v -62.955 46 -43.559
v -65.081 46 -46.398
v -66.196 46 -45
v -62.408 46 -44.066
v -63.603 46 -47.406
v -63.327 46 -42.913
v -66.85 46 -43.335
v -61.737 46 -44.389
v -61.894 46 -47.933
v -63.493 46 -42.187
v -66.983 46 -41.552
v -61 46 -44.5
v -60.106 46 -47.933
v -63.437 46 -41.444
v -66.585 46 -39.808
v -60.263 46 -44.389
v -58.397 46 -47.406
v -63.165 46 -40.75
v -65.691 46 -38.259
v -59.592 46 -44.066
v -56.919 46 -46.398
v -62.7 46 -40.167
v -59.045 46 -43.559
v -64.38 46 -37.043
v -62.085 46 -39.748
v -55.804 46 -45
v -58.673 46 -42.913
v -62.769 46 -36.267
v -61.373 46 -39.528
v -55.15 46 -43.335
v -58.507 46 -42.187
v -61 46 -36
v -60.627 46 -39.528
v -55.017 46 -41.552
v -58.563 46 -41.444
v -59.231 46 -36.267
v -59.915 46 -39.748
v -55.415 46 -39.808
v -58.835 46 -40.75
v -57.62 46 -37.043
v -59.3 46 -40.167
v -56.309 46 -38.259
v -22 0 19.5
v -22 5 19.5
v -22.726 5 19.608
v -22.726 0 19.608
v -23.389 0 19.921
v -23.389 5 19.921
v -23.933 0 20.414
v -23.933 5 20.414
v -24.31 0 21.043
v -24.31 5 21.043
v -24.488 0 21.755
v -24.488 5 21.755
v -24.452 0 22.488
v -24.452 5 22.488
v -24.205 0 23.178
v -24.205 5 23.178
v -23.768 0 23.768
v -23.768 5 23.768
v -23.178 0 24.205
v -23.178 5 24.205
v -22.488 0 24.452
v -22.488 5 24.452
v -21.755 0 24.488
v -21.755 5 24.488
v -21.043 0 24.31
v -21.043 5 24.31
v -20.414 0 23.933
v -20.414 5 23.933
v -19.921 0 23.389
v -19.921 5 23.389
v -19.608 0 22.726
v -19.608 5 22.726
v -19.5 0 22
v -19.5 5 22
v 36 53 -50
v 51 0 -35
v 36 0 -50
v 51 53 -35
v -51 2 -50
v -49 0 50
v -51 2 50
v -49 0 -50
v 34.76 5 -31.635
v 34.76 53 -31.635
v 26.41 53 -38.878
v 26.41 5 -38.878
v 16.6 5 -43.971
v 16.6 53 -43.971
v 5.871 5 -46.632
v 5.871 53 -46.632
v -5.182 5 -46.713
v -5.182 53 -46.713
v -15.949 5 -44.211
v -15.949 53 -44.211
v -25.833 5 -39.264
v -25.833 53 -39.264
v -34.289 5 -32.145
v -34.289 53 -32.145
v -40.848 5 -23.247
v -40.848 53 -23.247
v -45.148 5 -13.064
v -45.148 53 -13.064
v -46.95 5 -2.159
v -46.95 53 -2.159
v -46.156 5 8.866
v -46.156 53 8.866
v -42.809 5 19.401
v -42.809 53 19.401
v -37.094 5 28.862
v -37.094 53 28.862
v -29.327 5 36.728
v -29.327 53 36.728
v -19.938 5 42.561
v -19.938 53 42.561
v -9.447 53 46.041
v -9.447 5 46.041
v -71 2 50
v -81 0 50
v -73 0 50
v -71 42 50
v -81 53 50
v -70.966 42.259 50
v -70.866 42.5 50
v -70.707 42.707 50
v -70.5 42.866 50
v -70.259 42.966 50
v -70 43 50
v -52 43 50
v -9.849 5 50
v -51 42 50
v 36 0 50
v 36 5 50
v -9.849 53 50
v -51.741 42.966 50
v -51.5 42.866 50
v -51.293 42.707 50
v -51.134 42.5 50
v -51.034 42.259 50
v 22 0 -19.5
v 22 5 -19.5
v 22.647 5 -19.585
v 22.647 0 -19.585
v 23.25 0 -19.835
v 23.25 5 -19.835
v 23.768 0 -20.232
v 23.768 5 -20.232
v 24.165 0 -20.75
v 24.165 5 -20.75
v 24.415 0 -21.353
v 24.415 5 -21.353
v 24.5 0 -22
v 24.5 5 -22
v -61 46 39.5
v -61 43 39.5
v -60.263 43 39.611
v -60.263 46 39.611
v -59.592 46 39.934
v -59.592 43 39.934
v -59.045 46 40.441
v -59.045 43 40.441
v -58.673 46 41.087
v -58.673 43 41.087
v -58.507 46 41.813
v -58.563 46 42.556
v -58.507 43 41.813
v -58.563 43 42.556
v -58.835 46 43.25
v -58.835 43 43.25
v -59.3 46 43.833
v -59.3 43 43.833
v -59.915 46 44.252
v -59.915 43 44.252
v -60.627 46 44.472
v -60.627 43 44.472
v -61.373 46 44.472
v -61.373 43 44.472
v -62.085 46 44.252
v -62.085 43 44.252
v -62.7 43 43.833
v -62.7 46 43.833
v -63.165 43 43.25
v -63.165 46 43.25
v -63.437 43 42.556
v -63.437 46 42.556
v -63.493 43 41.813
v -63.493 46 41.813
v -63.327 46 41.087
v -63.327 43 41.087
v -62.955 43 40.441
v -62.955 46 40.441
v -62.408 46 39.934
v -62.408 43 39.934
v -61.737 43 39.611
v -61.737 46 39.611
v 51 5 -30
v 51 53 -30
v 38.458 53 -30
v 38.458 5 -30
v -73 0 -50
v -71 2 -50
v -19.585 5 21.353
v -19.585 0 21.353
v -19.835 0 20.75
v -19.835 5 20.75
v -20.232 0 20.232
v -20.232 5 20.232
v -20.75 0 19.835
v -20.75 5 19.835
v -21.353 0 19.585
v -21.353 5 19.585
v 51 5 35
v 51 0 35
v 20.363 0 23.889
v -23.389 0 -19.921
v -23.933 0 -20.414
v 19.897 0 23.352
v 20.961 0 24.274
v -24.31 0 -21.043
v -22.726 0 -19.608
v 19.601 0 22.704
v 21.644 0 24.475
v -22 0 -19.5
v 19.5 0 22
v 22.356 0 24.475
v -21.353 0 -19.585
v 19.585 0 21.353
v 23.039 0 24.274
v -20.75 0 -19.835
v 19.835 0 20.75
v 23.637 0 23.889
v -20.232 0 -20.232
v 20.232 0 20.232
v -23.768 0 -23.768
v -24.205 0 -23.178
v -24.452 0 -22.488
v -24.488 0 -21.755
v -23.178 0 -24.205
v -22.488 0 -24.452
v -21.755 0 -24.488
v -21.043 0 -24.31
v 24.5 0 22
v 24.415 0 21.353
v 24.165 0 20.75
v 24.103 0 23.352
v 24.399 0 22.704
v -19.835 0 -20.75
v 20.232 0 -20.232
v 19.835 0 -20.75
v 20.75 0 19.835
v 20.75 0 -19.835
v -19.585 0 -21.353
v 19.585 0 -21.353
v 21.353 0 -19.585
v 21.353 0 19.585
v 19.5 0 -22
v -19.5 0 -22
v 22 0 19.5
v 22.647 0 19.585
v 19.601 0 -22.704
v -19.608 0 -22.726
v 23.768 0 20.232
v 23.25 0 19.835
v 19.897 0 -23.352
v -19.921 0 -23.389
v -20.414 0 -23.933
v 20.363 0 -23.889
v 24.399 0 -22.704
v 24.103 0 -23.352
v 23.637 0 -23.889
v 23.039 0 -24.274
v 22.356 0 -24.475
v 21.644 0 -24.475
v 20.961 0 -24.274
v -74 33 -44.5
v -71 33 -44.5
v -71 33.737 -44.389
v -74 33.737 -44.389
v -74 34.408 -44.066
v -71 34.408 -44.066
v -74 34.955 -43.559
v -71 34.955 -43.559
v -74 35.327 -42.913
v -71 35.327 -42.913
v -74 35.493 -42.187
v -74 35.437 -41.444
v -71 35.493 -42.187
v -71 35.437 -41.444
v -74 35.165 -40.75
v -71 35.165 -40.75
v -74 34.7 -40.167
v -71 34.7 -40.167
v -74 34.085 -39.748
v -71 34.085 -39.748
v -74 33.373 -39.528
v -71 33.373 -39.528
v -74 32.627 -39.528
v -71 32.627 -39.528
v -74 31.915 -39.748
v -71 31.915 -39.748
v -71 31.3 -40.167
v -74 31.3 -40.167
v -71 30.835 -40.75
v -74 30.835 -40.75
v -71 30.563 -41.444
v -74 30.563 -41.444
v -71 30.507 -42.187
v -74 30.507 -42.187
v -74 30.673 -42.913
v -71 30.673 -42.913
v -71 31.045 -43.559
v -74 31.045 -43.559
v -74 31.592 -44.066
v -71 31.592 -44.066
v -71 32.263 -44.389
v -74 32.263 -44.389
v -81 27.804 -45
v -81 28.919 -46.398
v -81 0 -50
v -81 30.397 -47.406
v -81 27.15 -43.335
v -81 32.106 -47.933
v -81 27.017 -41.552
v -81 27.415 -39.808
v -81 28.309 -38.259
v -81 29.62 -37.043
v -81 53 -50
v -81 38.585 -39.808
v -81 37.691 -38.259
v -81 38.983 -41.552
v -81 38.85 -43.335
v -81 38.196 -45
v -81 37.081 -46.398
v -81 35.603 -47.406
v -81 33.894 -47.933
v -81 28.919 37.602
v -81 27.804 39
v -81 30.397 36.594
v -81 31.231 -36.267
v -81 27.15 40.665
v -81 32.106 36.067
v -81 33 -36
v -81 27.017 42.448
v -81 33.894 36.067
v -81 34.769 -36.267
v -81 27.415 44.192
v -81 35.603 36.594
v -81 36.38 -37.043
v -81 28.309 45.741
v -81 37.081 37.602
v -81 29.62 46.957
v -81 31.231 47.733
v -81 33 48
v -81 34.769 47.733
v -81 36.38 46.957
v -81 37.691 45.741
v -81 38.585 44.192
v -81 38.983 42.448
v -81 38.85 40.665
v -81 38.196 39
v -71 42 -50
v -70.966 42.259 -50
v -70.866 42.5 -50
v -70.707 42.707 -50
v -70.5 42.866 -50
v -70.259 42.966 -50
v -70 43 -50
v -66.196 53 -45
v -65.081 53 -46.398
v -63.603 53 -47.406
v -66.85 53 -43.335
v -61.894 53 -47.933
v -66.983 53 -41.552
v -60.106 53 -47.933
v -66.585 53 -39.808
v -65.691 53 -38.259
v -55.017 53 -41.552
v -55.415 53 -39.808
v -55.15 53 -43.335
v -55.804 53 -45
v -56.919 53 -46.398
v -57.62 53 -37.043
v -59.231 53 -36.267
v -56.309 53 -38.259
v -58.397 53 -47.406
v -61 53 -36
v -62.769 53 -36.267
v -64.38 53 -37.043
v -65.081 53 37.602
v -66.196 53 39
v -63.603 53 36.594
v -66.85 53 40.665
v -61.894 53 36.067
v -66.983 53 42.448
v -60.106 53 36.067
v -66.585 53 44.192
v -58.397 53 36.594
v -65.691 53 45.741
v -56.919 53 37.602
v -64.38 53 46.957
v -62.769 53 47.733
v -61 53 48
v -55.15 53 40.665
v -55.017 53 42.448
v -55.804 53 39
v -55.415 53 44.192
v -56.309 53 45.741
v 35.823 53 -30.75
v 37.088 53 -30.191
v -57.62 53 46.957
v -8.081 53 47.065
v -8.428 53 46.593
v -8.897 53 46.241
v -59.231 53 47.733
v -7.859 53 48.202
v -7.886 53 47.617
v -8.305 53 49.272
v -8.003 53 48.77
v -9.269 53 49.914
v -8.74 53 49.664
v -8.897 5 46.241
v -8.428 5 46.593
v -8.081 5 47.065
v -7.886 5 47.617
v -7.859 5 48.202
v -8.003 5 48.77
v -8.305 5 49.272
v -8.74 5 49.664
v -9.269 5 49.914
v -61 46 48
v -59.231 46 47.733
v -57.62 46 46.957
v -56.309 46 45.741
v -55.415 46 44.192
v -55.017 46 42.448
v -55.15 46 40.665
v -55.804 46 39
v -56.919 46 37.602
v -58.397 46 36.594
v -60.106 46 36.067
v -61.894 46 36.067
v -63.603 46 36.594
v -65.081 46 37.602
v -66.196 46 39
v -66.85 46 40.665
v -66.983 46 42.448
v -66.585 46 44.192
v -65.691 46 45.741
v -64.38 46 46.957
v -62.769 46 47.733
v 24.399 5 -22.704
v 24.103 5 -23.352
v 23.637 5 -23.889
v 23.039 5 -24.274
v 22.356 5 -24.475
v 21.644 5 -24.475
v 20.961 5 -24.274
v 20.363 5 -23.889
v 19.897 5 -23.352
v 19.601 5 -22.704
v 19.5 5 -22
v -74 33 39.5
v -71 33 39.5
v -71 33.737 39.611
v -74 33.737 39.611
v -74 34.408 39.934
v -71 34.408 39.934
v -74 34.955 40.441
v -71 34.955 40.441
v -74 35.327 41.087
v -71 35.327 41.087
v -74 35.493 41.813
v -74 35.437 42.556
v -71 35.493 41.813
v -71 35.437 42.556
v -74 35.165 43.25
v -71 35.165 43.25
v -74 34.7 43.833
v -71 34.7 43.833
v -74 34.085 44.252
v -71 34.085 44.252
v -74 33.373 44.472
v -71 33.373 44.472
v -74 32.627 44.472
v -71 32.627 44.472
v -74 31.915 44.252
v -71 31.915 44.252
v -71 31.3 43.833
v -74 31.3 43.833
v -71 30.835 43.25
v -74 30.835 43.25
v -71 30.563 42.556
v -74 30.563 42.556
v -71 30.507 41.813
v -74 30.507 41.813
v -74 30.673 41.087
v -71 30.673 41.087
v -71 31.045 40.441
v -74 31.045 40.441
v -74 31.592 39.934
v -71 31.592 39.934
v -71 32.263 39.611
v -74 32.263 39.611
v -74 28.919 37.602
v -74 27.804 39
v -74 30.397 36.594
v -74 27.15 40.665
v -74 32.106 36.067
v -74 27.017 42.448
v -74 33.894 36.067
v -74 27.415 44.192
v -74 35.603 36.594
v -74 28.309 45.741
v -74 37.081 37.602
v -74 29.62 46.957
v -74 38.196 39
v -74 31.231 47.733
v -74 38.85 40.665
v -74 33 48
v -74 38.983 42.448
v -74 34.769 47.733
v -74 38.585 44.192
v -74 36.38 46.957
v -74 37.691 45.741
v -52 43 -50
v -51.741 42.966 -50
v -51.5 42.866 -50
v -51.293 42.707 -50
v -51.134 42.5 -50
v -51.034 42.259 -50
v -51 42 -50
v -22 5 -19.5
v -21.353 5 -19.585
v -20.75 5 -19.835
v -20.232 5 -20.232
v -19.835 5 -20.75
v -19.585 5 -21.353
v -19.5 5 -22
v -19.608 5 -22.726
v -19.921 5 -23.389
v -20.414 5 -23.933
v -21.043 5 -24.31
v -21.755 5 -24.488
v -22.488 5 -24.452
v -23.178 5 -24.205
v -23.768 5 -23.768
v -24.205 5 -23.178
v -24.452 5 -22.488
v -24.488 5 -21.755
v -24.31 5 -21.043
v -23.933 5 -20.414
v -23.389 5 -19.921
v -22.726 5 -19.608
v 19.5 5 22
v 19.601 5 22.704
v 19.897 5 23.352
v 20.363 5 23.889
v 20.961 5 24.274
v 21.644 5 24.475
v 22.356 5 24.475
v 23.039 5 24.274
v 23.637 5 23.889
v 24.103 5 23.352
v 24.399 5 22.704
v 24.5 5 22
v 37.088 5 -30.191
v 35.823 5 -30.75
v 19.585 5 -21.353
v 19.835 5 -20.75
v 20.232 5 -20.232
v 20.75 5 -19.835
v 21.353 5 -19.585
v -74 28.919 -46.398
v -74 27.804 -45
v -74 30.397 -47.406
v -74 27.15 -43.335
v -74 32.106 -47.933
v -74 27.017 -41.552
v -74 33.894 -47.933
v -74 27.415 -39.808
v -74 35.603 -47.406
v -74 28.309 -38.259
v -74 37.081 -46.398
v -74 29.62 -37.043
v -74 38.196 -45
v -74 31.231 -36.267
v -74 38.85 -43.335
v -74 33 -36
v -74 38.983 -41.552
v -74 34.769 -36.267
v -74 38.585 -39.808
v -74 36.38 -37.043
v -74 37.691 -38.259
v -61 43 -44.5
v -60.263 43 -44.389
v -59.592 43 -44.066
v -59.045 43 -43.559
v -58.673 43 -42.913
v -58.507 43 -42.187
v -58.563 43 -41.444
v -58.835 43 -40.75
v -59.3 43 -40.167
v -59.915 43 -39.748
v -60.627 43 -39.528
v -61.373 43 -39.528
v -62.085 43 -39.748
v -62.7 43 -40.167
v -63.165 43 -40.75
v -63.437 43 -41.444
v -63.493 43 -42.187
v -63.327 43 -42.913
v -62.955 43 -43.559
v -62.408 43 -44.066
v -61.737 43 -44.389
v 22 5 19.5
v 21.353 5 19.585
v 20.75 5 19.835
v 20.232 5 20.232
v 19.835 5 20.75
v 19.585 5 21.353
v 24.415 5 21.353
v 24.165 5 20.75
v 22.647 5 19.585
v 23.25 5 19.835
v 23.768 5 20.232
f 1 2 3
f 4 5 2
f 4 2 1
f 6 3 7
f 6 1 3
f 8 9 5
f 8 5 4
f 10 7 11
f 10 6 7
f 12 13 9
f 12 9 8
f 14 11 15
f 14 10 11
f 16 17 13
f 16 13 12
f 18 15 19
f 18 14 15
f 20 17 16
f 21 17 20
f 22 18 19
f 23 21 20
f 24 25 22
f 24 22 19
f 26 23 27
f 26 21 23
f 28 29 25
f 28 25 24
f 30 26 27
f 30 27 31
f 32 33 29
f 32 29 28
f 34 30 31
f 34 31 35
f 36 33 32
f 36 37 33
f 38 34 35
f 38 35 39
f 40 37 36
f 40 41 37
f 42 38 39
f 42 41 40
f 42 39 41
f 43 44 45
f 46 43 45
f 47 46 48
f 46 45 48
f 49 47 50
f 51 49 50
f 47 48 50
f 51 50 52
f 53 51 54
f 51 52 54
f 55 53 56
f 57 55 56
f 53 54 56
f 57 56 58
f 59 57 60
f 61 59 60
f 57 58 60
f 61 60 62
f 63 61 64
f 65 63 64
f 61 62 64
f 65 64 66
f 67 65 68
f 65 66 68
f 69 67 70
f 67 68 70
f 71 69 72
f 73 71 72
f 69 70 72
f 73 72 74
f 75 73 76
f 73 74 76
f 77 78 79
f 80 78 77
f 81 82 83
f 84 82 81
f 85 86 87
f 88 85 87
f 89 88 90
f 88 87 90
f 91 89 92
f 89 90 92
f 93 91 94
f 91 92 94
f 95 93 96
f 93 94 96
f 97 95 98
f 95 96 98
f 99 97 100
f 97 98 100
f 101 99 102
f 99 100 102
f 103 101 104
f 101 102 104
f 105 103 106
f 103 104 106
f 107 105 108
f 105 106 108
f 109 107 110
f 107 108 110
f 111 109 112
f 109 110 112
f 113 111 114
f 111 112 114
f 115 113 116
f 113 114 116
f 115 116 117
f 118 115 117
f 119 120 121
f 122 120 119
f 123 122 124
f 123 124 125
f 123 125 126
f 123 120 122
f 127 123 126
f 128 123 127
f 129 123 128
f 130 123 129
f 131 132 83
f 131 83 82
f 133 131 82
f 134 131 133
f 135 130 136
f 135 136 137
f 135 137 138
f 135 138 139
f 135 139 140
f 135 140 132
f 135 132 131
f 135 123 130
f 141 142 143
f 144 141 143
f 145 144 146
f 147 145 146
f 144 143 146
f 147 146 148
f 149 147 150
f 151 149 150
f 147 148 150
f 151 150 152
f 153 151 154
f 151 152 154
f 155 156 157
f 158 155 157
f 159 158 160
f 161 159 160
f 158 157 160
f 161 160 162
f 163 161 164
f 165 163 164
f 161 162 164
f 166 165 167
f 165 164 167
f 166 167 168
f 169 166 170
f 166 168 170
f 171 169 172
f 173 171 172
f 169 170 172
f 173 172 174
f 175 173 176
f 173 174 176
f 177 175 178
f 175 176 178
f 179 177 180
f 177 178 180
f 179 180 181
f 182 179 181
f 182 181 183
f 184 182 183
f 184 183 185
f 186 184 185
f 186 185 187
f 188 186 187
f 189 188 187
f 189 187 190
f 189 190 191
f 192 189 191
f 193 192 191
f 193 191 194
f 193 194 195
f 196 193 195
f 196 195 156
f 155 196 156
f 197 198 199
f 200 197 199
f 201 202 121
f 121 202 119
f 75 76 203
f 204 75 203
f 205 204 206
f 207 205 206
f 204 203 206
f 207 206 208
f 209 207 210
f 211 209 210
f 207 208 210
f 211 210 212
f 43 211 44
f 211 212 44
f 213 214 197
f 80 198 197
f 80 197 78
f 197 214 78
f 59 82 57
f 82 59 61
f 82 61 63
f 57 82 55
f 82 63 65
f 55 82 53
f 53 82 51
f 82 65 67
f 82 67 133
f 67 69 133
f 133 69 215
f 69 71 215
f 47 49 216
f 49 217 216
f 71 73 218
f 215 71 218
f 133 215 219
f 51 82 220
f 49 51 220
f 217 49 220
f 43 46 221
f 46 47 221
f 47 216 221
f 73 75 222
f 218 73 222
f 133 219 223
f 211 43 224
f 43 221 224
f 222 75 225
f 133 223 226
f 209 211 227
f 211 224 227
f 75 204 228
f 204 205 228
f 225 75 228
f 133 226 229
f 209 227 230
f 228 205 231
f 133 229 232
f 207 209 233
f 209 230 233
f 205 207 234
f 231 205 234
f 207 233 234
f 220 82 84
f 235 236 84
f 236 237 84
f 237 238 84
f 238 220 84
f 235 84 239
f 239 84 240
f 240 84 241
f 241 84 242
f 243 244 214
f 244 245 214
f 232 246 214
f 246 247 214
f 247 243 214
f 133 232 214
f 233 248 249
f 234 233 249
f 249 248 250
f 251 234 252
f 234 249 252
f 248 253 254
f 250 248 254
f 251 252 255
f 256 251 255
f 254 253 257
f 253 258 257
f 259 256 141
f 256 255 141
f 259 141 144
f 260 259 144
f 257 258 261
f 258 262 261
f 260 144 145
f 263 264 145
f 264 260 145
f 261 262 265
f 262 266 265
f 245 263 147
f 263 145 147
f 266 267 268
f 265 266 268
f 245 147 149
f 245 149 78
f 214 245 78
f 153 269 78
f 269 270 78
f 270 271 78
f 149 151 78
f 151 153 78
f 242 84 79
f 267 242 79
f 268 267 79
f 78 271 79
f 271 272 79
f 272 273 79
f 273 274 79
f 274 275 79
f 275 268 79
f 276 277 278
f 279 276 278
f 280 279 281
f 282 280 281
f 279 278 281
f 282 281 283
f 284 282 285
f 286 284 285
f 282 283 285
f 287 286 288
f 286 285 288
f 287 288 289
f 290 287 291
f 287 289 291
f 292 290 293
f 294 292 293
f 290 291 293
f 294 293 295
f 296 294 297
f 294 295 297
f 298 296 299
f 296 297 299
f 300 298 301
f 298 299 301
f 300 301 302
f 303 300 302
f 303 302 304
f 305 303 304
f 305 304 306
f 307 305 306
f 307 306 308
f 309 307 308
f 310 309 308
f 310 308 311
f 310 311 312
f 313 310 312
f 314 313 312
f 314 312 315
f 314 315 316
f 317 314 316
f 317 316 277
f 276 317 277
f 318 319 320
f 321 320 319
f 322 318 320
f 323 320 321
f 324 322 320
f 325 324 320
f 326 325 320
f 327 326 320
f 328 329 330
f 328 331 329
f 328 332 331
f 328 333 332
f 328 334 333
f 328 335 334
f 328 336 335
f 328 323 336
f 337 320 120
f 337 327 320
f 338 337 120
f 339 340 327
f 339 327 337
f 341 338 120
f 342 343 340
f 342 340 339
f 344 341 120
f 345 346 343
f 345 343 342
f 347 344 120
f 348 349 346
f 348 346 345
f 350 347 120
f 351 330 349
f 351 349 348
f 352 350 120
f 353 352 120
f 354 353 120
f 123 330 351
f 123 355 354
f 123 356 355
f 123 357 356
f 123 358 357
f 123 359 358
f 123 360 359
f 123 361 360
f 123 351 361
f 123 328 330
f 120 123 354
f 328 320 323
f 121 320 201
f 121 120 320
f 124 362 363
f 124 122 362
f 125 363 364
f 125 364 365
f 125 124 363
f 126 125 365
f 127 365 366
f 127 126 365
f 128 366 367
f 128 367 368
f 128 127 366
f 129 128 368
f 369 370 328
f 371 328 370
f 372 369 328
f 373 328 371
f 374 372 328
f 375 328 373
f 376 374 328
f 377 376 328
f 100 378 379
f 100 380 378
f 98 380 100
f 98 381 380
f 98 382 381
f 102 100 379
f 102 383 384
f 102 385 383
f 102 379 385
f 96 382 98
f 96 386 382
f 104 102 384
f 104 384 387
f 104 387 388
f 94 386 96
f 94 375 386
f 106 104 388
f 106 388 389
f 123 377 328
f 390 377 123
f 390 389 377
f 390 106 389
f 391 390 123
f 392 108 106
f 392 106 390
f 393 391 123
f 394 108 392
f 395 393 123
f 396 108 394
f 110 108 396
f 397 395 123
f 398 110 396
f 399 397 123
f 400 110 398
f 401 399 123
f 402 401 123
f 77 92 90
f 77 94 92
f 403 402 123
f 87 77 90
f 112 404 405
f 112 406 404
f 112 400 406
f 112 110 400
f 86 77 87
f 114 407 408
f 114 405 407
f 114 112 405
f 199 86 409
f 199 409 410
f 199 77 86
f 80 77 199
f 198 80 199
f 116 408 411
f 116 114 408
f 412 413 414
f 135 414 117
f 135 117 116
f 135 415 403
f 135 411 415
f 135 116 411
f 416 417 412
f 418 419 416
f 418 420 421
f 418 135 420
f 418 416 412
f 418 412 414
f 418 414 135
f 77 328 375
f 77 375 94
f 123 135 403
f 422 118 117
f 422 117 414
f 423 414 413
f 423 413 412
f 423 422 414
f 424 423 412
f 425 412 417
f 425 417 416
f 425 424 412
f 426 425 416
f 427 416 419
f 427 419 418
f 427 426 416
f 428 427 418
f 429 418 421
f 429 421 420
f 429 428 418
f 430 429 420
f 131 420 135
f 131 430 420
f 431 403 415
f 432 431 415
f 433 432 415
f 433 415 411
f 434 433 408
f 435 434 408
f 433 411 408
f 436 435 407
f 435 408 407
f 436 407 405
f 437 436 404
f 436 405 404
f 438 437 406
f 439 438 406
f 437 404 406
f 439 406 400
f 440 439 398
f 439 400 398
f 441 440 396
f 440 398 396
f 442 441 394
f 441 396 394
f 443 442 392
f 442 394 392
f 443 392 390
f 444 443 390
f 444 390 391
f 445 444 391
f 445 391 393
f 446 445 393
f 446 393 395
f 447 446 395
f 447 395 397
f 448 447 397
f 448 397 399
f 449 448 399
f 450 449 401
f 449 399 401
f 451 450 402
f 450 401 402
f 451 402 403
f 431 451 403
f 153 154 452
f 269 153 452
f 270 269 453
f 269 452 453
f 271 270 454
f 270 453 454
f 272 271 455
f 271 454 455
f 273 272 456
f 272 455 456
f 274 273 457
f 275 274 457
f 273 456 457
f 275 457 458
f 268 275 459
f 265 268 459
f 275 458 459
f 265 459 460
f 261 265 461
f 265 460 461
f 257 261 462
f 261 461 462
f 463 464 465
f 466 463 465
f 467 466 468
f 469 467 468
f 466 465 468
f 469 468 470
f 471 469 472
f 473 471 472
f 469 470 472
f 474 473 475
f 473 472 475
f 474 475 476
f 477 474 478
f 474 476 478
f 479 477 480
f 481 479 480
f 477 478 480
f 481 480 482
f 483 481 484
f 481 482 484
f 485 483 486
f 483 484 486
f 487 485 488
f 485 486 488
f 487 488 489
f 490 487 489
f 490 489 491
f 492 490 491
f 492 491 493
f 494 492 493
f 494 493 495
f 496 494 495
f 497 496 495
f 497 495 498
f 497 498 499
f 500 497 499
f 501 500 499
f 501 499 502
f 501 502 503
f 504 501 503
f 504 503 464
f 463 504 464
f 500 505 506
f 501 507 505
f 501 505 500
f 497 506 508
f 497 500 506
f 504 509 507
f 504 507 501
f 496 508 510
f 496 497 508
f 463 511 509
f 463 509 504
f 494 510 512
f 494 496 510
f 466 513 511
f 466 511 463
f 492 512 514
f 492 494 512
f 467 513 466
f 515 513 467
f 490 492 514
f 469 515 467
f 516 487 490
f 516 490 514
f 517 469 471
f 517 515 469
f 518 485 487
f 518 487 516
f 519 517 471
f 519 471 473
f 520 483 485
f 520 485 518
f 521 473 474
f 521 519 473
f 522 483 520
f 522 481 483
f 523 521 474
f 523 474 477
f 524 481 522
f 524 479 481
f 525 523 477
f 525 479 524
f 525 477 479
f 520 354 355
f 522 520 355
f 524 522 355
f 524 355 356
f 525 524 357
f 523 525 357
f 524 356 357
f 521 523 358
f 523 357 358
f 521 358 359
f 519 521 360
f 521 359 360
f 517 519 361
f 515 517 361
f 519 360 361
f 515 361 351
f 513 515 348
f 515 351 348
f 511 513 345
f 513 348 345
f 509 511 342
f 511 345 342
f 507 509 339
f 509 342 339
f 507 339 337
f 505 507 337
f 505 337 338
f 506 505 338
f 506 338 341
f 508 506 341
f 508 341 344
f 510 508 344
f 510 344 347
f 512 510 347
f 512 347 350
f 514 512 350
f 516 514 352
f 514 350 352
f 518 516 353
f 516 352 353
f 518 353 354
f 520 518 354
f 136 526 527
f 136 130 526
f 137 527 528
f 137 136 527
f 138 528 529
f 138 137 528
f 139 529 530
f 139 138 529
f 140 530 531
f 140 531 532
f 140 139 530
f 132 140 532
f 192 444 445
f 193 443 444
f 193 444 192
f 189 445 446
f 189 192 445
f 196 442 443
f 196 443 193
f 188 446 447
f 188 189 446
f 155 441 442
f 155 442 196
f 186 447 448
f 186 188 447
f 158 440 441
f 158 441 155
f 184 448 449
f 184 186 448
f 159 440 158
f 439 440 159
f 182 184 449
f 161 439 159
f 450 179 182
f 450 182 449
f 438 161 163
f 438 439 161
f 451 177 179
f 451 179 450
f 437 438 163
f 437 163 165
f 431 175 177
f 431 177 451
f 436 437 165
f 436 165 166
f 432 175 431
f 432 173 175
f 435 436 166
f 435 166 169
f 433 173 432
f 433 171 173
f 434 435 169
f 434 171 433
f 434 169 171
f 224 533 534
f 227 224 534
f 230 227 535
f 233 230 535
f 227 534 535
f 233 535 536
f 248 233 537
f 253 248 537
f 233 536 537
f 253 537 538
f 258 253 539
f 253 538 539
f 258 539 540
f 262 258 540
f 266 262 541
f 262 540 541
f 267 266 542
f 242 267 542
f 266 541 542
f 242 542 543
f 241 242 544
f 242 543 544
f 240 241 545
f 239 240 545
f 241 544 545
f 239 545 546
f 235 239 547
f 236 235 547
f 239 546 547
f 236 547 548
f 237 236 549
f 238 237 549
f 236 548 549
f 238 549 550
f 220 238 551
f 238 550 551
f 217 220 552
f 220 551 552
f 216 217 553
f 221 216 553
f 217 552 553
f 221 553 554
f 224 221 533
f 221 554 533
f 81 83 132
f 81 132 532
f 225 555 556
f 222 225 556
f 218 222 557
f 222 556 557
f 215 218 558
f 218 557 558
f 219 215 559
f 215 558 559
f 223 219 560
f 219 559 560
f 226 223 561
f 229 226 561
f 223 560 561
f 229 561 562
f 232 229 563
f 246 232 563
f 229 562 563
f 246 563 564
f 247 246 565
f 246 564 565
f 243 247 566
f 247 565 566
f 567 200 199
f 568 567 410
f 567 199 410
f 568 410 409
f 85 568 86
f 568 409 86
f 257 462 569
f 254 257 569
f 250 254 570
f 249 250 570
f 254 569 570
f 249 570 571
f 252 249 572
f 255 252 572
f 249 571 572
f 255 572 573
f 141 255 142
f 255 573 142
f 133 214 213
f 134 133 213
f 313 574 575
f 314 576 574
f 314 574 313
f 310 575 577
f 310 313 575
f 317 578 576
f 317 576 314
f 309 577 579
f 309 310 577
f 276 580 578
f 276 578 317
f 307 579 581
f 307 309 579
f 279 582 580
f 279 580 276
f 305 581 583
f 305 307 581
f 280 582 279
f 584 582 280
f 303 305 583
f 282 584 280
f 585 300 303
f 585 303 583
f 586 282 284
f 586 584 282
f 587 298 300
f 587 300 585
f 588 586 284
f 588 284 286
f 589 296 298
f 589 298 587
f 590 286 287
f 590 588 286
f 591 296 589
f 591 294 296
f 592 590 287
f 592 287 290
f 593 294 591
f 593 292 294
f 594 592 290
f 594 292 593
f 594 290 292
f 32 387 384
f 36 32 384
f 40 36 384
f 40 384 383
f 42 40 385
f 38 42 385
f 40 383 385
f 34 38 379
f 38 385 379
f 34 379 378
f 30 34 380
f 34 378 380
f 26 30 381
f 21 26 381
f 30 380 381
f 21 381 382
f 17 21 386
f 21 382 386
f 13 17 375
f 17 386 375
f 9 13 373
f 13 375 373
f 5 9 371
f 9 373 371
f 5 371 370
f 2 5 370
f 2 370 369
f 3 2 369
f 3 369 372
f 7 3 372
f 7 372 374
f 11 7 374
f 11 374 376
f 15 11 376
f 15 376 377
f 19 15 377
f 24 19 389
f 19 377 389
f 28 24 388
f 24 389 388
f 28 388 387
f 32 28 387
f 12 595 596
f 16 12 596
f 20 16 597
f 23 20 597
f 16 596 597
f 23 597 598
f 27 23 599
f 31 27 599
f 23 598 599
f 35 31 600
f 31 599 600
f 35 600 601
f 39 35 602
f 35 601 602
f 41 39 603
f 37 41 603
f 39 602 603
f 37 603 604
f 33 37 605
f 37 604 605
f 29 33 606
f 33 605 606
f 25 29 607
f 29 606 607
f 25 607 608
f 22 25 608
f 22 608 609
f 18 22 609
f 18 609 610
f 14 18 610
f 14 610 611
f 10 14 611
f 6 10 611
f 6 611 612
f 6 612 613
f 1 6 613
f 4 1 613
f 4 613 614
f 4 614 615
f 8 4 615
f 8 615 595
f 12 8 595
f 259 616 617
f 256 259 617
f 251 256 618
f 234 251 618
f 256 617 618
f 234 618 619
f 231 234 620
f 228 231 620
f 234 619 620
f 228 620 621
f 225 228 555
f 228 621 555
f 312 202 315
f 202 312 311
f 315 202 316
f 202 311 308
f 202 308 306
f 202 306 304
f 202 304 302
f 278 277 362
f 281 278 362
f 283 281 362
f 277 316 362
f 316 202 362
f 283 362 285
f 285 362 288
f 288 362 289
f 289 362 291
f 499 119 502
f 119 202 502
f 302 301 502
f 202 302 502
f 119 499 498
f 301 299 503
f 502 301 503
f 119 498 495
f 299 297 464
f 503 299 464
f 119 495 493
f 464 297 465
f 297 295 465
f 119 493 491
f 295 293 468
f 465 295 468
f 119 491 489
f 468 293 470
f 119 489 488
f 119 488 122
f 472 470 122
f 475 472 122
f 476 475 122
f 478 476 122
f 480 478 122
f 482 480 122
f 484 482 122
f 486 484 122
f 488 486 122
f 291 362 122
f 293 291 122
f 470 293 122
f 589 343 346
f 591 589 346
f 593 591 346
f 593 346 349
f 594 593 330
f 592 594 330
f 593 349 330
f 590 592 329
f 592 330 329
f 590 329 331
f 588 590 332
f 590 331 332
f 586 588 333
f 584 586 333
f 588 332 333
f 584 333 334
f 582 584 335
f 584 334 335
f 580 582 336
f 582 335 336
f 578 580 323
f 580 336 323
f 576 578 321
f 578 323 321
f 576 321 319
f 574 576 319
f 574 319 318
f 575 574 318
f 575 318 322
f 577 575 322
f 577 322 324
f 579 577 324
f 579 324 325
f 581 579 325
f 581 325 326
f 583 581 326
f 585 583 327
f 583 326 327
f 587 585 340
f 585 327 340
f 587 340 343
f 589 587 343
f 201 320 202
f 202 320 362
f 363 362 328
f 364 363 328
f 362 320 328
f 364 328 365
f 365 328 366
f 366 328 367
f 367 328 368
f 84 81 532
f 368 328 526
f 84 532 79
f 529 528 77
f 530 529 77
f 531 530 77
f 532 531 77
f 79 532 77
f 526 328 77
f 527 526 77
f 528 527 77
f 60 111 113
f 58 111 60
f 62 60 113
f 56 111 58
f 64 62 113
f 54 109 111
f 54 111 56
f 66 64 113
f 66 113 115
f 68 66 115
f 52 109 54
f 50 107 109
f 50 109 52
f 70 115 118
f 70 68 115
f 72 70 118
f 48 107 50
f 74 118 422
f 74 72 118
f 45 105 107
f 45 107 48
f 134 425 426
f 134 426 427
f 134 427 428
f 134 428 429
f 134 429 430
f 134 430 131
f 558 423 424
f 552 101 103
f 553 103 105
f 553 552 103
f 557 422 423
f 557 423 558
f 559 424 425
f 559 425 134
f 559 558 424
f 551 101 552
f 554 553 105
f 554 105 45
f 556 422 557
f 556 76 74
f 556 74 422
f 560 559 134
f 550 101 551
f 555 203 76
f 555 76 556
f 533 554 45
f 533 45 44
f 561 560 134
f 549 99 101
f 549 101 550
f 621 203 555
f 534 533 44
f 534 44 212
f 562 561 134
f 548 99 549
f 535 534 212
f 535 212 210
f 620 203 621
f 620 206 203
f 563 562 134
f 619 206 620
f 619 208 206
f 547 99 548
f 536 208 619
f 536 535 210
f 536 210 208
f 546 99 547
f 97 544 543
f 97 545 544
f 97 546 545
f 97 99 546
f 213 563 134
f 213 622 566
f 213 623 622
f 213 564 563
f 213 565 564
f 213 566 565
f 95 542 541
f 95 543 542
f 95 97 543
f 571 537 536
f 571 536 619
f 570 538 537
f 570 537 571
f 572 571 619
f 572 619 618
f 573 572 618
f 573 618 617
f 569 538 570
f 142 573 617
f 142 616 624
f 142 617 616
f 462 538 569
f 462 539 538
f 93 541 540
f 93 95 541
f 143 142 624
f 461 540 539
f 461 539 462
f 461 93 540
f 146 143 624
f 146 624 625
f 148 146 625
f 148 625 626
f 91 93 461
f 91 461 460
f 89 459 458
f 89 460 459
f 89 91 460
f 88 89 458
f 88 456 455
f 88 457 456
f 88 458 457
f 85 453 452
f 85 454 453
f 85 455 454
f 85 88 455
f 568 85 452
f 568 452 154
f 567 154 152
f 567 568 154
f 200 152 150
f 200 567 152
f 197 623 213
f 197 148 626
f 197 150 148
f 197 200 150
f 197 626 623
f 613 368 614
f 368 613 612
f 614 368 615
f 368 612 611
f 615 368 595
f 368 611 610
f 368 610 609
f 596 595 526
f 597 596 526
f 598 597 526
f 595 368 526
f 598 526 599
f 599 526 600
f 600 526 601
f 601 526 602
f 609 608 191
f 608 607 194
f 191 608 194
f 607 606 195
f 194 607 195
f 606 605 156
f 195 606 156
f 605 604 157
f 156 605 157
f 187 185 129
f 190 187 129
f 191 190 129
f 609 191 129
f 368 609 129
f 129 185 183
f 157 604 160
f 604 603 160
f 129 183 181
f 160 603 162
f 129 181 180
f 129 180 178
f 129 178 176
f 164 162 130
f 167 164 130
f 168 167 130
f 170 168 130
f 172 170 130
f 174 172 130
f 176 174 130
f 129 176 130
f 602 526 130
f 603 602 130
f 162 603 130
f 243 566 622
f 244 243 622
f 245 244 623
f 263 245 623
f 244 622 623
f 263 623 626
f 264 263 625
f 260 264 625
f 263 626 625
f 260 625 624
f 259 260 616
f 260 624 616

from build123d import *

# Parameters (mm, degrees)
SKETCH_1_W          = 102
SKETCH_1_H          = 100
EXTRUDE_1_DEPTH     = 53
CUT_EXTRUDE_1_DEPTH = 48
SKETCH_3_W          = 51
SKETCH_3_H          = 50
CUT_EXTRUDE_2_DEPTH = 48
CUT_EXTRUDE_3_DEPTH = 48
CHAMFER_1_SIZE      = 15
FILLET_2_R          = 5
SKETCH_5_W          = 100
SKETCH_5_H          = 10
EXTRUDE_2_DEPTH     = 30
SKETCH_6_W          = 10
SKETCH_6_H          = 100
EXTRUDE_3_DEPTH     = 43
FILLET_START        = 5
FILLET_5_DEPTH      = 49
SKETCH_8_R          = 2.5
CUT_EXTRUDE_4_DEPTH = 30
SKETCH_9_R          = 6
CUT_EXTRUDE_5_DEPTH = 7
SKETCH_10_R         = 2.5
CUT_EXTRUDE_6_DEPTH = 30
SKETCH_11_R         = 6
CUT_EXTRUDE_7_DEPTH = 7
CHAMFER_2_SIZE      = 2
FILLET_7_R          = 1


with BuildPart() as part:
    # 草图1 → 凸台-拉伸1 (new body)
    with BuildSketch(Plane(origin=(0, 0, 0), x_dir=(1, 0, 0), z_dir=(0, 1, 0))):
        Rectangle(SKETCH_1_W, SKETCH_1_H)
    extrude(amount=EXTRUDE_1_DEPTH)

    # 草图2 → 切除-拉伸1 (cut)
    with BuildSketch(Plane(origin=(0, 53, 0), x_dir=(1, 0, 0), z_dir=(0, 1, 0))):
        with BuildLine():
            Line((23, -30), (23, 30))
            Line((23, 30), (36.18010503, 30))
            ThreePointArc((36.18010503, 30), (-47, 0), (36.18010503, -30))
            Line((36.18010503, -30), (23, -30))
        make_face()
        with BuildLine():
            Line((36.18010503, 30), (23, 30))
            Line((23, 30), (23, -30))
            Line((23, -30), (36.18010503, -30))
            ThreePointArc((36.18010503, -30), (44.21235651, -15.94576846), (47, 0))
            ThreePointArc((47, 0), (44.21235651, 15.94576846), (36.18010503, 30))
        make_face()
        with BuildLine():
            Line((51, 30), (36.18010503, 30))
            ThreePointArc((36.18010503, 30), (44.21235651, 15.94576846), (47, 0))
            ThreePointArc((47, 0), (44.21235651, -15.94576846), (36.18010503, -30))
            Line((36.18010503, -30), (51, -30))
            Line((51, -30), (51, 30))
        make_face()
    extrude(amount=-CUT_EXTRUDE_1_DEPTH, mode=Mode.SUBTRACT)

    # 草图3 → 切除-拉伸2 (cut)
    with BuildSketch(Plane(origin=(0, 53, 0), x_dir=(1, 0, 0), z_dir=(0, 1, 0))):
        with Locations((25.5, -25)):
            Rectangle(SKETCH_3_W, SKETCH_3_H)
    extrude(amount=-CUT_EXTRUDE_2_DEPTH, mode=Mode.SUBTRACT)

    # 草图4 → 切除-拉伸3 (cut)
    with BuildSketch(Plane(origin=(0, 5, 0), x_dir=(1, 0, 0), z_dir=(0, 1, 0))):
        with BuildLine():
            ThreePointArc((24.5, 22), (22, 24.5), (19.5, 22))
            Line((19.5, 22), (22, 22))
            Line((22, 22), (22, 19.5))
            ThreePointArc((22, 19.5), (23.767766953, 20.232233047), (24.5, 22))
        make_face()
        with BuildLine():
            Line((22, 22), (19.5, 22))
            ThreePointArc((19.5, 22), (20.232233047, 20.232233047), (22, 19.5))
            Line((22, 19.5), (22, 22))
        make_face()
        with BuildLine():
            Line((-22, 19.5), (-22, 22))
            Line((-22, 22), (-19.5, 22))
            ThreePointArc((-19.5, 22), (-23.767766953, 23.767766953), (-22, 19.5))
        make_face()
        with BuildLine():
            Line((-19.5, 22), (-22, 22))
            Line((-22, 22), (-22, 19.5))
            ThreePointArc((-22, 19.5), (-20.232233047, 20.232233047), (-19.5, 22))
        make_face()
        with BuildLine():
            ThreePointArc((-19.5, -22), (-20.232233047, -20.232233047), (-22, -19.5))
            Line((-22, -19.5), (-22, -22))
            Line((-22, -22), (-19.5, -22))
        make_face()
        with BuildLine():
            Line((-22, -22), (-22, -19.5))
            ThreePointArc((-22, -19.5), (-23.767766953, -23.767766953), (-19.5, -22))
            Line((-19.5, -22), (-22, -22))
        make_face()
        with BuildLine():
            ThreePointArc((24.5, -22), (23.767766953, -20.232233047), (22, -19.5))
            Line((22, -19.5), (22, -22))
            Line((22, -22), (19.5, -22))
            ThreePointArc((19.5, -22), (22, -24.5), (24.5, -22))
        make_face()
        with BuildLine():
            Line((22, -22), (22, -19.5))
            ThreePointArc((22, -19.5), (20.232233047, -20.232233047), (19.5, -22))
            Line((19.5, -22), (22, -22))
        make_face()
    extrude(amount=-CUT_EXTRUDE_3_DEPTH, mode=Mode.SUBTRACT)

    # 倒角1
    chamfer_1_edges = [part.edges().sort_by_distance(p)[0] for p in [
        (51, 2.5, 50),
        (51, 26.5, -50),
    ]]
    chamfer(chamfer_1_edges, length=CHAMFER_1_SIZE)

    # 圆角2
    # the kernel refuses this fillet: 5 mm, written as the material it takes off along each edge
    with BuildSketch(Plane(origin=(0, 5, 47), x_dir=(-0.9989898744385596, 0, -0.0449358517136451), z_dir=(0, 1, 0))) as fillet_2_piece_1:
        with BuildLine():
            CenterArc((4.44864932, 4.994949372), FILLET_2_R, 203.55292178, 63.871576317)
            Line((-0.134807555, 2.996969623), (0, 0))
            ThreePointArc((0, 0), (2.111985031, 0.047475901), (4.223970061, 0))
        make_face()
    extrude(amount=58.559925153, mode=Mode.SUBTRACT)
    with BuildSketch(Plane(origin=(36.18010503, 58.69416004, -30), x_dir=(1, 0, 0), z_dir=(0, -1, 0))) as fillet_2_piece_2:
        with BuildLine():
            CenterArc((2.277664016, -5), FILLET_2_R, 90, 47.695010293)
            ThreePointArc((-1.420198392, -1.634615385), (-0.700684154, -0.825487738), (0, 0))
            Line((0, 0), (2.277664016, 0))
        make_face()
    extrude(amount=53.69416004, mode=Mode.SUBTRACT)

    # 草图5 → 凸台-拉伸2 (add)
    with BuildSketch(Plane.ZY.offset(51)):
        with Locations((0, 48)):
            Rectangle(SKETCH_5_W, SKETCH_5_H)
    extrude(amount=EXTRUDE_2_DEPTH)

    # 草图6 → 凸台-拉伸3 (add)
    with BuildSketch(Plane.XZ.offset(-43)):
        with Locations((-76, 0)):
            Rectangle(SKETCH_6_W, SKETCH_6_H)
    extrude(amount=EXTRUDE_3_DEPTH)

    # 圆角5: read off the stored shape, not the designer's step
    # 圆角5 outline → 圆角5 (cut)
    with BuildSketch(Plane(origin=(0, 0, 0), x_dir=(1, 0, 0), z_dir=(0, 1, 0)).offset(FILLET_START)):
        with BuildLine():
            ThreePointArc((-9.446863606, -46.040816327), (-7.859088048, -48.202030509), (-9.848857802, -50))
            Line((-9.848857802, -50), (0, -50))
            ThreePointArc((0, -50), (-1.653487381, -47.801385193), (-4.219703321, -46.810192308))
            ThreePointArc((-4.219703321, -46.810192308), (-6.844103136, -46.499013455), (-9.446863606, -46.040816327))
        make_face()
    extrude(amount=FILLET_5_DEPTH, mode=Mode.SUBTRACT)

    # 草图8 → 切除-拉伸4 (cut)
    with BuildSketch(Plane.XZ.offset(-43)):
        with Locations(Location((-61, 42, 0), (0, 0, 270))):
            Circle(SKETCH_8_R)
        with Locations(Location((-61, -42, 0), (0, 0, 270))):
            Circle(SKETCH_8_R)
    extrude(amount=-CUT_EXTRUDE_4_DEPTH, mode=Mode.SUBTRACT)

    # 草图9 → 切除-拉伸5 (cut)
    with BuildSketch(Plane(origin=(0, 53, 0), x_dir=(1, 0, 0), z_dir=(0, 1, 0))):
        with Locations(Location((-61, 42, 0), (0, 0, 270))):
            Circle(SKETCH_9_R)
        with Locations(Location((-61, -42, 0), (0, 0, 270))):
            Circle(SKETCH_9_R)
    extrude(amount=-CUT_EXTRUDE_5_DEPTH, mode=Mode.SUBTRACT)

    # 草图10 → 切除-拉伸6 (cut)
    with BuildSketch(Plane(origin=(-71, 0, 0), x_dir=(0, 0, -1), z_dir=(1, 0, 0))):
        with Locations((-42, 33)):
            Circle(SKETCH_10_R)
        with Locations((42, 33)):
            Circle(SKETCH_10_R)
    extrude(amount=-CUT_EXTRUDE_6_DEPTH, mode=Mode.SUBTRACT)

    # 草图11 → 切除-拉伸7 (cut)
    with BuildSketch(Plane.ZY.offset(81)):
        with Locations((-42, 33)):
            Circle(SKETCH_11_R)
        with Locations((42, 33)):
            Circle(SKETCH_11_R)
    extrude(amount=-CUT_EXTRUDE_7_DEPTH, mode=Mode.SUBTRACT)

    # 倒角2
    chamfer_2_edges = [part.edges().sort_by_distance(p)[0] for p in [
        (-71, 0, 0),
        (-51, 0, 0),
    ]]
    chamfer(chamfer_2_edges, length=CHAMFER_2_SIZE)

    # 圆角7
    fillet_7_edges = [part.edges().sort_by_distance(p)[0] for p in [
        (-51, 43, 0),
        (-71, 43, 0),
    ]]
    fillet(fillet_7_edges, radius=FILLET_7_R)


solid = part.part
